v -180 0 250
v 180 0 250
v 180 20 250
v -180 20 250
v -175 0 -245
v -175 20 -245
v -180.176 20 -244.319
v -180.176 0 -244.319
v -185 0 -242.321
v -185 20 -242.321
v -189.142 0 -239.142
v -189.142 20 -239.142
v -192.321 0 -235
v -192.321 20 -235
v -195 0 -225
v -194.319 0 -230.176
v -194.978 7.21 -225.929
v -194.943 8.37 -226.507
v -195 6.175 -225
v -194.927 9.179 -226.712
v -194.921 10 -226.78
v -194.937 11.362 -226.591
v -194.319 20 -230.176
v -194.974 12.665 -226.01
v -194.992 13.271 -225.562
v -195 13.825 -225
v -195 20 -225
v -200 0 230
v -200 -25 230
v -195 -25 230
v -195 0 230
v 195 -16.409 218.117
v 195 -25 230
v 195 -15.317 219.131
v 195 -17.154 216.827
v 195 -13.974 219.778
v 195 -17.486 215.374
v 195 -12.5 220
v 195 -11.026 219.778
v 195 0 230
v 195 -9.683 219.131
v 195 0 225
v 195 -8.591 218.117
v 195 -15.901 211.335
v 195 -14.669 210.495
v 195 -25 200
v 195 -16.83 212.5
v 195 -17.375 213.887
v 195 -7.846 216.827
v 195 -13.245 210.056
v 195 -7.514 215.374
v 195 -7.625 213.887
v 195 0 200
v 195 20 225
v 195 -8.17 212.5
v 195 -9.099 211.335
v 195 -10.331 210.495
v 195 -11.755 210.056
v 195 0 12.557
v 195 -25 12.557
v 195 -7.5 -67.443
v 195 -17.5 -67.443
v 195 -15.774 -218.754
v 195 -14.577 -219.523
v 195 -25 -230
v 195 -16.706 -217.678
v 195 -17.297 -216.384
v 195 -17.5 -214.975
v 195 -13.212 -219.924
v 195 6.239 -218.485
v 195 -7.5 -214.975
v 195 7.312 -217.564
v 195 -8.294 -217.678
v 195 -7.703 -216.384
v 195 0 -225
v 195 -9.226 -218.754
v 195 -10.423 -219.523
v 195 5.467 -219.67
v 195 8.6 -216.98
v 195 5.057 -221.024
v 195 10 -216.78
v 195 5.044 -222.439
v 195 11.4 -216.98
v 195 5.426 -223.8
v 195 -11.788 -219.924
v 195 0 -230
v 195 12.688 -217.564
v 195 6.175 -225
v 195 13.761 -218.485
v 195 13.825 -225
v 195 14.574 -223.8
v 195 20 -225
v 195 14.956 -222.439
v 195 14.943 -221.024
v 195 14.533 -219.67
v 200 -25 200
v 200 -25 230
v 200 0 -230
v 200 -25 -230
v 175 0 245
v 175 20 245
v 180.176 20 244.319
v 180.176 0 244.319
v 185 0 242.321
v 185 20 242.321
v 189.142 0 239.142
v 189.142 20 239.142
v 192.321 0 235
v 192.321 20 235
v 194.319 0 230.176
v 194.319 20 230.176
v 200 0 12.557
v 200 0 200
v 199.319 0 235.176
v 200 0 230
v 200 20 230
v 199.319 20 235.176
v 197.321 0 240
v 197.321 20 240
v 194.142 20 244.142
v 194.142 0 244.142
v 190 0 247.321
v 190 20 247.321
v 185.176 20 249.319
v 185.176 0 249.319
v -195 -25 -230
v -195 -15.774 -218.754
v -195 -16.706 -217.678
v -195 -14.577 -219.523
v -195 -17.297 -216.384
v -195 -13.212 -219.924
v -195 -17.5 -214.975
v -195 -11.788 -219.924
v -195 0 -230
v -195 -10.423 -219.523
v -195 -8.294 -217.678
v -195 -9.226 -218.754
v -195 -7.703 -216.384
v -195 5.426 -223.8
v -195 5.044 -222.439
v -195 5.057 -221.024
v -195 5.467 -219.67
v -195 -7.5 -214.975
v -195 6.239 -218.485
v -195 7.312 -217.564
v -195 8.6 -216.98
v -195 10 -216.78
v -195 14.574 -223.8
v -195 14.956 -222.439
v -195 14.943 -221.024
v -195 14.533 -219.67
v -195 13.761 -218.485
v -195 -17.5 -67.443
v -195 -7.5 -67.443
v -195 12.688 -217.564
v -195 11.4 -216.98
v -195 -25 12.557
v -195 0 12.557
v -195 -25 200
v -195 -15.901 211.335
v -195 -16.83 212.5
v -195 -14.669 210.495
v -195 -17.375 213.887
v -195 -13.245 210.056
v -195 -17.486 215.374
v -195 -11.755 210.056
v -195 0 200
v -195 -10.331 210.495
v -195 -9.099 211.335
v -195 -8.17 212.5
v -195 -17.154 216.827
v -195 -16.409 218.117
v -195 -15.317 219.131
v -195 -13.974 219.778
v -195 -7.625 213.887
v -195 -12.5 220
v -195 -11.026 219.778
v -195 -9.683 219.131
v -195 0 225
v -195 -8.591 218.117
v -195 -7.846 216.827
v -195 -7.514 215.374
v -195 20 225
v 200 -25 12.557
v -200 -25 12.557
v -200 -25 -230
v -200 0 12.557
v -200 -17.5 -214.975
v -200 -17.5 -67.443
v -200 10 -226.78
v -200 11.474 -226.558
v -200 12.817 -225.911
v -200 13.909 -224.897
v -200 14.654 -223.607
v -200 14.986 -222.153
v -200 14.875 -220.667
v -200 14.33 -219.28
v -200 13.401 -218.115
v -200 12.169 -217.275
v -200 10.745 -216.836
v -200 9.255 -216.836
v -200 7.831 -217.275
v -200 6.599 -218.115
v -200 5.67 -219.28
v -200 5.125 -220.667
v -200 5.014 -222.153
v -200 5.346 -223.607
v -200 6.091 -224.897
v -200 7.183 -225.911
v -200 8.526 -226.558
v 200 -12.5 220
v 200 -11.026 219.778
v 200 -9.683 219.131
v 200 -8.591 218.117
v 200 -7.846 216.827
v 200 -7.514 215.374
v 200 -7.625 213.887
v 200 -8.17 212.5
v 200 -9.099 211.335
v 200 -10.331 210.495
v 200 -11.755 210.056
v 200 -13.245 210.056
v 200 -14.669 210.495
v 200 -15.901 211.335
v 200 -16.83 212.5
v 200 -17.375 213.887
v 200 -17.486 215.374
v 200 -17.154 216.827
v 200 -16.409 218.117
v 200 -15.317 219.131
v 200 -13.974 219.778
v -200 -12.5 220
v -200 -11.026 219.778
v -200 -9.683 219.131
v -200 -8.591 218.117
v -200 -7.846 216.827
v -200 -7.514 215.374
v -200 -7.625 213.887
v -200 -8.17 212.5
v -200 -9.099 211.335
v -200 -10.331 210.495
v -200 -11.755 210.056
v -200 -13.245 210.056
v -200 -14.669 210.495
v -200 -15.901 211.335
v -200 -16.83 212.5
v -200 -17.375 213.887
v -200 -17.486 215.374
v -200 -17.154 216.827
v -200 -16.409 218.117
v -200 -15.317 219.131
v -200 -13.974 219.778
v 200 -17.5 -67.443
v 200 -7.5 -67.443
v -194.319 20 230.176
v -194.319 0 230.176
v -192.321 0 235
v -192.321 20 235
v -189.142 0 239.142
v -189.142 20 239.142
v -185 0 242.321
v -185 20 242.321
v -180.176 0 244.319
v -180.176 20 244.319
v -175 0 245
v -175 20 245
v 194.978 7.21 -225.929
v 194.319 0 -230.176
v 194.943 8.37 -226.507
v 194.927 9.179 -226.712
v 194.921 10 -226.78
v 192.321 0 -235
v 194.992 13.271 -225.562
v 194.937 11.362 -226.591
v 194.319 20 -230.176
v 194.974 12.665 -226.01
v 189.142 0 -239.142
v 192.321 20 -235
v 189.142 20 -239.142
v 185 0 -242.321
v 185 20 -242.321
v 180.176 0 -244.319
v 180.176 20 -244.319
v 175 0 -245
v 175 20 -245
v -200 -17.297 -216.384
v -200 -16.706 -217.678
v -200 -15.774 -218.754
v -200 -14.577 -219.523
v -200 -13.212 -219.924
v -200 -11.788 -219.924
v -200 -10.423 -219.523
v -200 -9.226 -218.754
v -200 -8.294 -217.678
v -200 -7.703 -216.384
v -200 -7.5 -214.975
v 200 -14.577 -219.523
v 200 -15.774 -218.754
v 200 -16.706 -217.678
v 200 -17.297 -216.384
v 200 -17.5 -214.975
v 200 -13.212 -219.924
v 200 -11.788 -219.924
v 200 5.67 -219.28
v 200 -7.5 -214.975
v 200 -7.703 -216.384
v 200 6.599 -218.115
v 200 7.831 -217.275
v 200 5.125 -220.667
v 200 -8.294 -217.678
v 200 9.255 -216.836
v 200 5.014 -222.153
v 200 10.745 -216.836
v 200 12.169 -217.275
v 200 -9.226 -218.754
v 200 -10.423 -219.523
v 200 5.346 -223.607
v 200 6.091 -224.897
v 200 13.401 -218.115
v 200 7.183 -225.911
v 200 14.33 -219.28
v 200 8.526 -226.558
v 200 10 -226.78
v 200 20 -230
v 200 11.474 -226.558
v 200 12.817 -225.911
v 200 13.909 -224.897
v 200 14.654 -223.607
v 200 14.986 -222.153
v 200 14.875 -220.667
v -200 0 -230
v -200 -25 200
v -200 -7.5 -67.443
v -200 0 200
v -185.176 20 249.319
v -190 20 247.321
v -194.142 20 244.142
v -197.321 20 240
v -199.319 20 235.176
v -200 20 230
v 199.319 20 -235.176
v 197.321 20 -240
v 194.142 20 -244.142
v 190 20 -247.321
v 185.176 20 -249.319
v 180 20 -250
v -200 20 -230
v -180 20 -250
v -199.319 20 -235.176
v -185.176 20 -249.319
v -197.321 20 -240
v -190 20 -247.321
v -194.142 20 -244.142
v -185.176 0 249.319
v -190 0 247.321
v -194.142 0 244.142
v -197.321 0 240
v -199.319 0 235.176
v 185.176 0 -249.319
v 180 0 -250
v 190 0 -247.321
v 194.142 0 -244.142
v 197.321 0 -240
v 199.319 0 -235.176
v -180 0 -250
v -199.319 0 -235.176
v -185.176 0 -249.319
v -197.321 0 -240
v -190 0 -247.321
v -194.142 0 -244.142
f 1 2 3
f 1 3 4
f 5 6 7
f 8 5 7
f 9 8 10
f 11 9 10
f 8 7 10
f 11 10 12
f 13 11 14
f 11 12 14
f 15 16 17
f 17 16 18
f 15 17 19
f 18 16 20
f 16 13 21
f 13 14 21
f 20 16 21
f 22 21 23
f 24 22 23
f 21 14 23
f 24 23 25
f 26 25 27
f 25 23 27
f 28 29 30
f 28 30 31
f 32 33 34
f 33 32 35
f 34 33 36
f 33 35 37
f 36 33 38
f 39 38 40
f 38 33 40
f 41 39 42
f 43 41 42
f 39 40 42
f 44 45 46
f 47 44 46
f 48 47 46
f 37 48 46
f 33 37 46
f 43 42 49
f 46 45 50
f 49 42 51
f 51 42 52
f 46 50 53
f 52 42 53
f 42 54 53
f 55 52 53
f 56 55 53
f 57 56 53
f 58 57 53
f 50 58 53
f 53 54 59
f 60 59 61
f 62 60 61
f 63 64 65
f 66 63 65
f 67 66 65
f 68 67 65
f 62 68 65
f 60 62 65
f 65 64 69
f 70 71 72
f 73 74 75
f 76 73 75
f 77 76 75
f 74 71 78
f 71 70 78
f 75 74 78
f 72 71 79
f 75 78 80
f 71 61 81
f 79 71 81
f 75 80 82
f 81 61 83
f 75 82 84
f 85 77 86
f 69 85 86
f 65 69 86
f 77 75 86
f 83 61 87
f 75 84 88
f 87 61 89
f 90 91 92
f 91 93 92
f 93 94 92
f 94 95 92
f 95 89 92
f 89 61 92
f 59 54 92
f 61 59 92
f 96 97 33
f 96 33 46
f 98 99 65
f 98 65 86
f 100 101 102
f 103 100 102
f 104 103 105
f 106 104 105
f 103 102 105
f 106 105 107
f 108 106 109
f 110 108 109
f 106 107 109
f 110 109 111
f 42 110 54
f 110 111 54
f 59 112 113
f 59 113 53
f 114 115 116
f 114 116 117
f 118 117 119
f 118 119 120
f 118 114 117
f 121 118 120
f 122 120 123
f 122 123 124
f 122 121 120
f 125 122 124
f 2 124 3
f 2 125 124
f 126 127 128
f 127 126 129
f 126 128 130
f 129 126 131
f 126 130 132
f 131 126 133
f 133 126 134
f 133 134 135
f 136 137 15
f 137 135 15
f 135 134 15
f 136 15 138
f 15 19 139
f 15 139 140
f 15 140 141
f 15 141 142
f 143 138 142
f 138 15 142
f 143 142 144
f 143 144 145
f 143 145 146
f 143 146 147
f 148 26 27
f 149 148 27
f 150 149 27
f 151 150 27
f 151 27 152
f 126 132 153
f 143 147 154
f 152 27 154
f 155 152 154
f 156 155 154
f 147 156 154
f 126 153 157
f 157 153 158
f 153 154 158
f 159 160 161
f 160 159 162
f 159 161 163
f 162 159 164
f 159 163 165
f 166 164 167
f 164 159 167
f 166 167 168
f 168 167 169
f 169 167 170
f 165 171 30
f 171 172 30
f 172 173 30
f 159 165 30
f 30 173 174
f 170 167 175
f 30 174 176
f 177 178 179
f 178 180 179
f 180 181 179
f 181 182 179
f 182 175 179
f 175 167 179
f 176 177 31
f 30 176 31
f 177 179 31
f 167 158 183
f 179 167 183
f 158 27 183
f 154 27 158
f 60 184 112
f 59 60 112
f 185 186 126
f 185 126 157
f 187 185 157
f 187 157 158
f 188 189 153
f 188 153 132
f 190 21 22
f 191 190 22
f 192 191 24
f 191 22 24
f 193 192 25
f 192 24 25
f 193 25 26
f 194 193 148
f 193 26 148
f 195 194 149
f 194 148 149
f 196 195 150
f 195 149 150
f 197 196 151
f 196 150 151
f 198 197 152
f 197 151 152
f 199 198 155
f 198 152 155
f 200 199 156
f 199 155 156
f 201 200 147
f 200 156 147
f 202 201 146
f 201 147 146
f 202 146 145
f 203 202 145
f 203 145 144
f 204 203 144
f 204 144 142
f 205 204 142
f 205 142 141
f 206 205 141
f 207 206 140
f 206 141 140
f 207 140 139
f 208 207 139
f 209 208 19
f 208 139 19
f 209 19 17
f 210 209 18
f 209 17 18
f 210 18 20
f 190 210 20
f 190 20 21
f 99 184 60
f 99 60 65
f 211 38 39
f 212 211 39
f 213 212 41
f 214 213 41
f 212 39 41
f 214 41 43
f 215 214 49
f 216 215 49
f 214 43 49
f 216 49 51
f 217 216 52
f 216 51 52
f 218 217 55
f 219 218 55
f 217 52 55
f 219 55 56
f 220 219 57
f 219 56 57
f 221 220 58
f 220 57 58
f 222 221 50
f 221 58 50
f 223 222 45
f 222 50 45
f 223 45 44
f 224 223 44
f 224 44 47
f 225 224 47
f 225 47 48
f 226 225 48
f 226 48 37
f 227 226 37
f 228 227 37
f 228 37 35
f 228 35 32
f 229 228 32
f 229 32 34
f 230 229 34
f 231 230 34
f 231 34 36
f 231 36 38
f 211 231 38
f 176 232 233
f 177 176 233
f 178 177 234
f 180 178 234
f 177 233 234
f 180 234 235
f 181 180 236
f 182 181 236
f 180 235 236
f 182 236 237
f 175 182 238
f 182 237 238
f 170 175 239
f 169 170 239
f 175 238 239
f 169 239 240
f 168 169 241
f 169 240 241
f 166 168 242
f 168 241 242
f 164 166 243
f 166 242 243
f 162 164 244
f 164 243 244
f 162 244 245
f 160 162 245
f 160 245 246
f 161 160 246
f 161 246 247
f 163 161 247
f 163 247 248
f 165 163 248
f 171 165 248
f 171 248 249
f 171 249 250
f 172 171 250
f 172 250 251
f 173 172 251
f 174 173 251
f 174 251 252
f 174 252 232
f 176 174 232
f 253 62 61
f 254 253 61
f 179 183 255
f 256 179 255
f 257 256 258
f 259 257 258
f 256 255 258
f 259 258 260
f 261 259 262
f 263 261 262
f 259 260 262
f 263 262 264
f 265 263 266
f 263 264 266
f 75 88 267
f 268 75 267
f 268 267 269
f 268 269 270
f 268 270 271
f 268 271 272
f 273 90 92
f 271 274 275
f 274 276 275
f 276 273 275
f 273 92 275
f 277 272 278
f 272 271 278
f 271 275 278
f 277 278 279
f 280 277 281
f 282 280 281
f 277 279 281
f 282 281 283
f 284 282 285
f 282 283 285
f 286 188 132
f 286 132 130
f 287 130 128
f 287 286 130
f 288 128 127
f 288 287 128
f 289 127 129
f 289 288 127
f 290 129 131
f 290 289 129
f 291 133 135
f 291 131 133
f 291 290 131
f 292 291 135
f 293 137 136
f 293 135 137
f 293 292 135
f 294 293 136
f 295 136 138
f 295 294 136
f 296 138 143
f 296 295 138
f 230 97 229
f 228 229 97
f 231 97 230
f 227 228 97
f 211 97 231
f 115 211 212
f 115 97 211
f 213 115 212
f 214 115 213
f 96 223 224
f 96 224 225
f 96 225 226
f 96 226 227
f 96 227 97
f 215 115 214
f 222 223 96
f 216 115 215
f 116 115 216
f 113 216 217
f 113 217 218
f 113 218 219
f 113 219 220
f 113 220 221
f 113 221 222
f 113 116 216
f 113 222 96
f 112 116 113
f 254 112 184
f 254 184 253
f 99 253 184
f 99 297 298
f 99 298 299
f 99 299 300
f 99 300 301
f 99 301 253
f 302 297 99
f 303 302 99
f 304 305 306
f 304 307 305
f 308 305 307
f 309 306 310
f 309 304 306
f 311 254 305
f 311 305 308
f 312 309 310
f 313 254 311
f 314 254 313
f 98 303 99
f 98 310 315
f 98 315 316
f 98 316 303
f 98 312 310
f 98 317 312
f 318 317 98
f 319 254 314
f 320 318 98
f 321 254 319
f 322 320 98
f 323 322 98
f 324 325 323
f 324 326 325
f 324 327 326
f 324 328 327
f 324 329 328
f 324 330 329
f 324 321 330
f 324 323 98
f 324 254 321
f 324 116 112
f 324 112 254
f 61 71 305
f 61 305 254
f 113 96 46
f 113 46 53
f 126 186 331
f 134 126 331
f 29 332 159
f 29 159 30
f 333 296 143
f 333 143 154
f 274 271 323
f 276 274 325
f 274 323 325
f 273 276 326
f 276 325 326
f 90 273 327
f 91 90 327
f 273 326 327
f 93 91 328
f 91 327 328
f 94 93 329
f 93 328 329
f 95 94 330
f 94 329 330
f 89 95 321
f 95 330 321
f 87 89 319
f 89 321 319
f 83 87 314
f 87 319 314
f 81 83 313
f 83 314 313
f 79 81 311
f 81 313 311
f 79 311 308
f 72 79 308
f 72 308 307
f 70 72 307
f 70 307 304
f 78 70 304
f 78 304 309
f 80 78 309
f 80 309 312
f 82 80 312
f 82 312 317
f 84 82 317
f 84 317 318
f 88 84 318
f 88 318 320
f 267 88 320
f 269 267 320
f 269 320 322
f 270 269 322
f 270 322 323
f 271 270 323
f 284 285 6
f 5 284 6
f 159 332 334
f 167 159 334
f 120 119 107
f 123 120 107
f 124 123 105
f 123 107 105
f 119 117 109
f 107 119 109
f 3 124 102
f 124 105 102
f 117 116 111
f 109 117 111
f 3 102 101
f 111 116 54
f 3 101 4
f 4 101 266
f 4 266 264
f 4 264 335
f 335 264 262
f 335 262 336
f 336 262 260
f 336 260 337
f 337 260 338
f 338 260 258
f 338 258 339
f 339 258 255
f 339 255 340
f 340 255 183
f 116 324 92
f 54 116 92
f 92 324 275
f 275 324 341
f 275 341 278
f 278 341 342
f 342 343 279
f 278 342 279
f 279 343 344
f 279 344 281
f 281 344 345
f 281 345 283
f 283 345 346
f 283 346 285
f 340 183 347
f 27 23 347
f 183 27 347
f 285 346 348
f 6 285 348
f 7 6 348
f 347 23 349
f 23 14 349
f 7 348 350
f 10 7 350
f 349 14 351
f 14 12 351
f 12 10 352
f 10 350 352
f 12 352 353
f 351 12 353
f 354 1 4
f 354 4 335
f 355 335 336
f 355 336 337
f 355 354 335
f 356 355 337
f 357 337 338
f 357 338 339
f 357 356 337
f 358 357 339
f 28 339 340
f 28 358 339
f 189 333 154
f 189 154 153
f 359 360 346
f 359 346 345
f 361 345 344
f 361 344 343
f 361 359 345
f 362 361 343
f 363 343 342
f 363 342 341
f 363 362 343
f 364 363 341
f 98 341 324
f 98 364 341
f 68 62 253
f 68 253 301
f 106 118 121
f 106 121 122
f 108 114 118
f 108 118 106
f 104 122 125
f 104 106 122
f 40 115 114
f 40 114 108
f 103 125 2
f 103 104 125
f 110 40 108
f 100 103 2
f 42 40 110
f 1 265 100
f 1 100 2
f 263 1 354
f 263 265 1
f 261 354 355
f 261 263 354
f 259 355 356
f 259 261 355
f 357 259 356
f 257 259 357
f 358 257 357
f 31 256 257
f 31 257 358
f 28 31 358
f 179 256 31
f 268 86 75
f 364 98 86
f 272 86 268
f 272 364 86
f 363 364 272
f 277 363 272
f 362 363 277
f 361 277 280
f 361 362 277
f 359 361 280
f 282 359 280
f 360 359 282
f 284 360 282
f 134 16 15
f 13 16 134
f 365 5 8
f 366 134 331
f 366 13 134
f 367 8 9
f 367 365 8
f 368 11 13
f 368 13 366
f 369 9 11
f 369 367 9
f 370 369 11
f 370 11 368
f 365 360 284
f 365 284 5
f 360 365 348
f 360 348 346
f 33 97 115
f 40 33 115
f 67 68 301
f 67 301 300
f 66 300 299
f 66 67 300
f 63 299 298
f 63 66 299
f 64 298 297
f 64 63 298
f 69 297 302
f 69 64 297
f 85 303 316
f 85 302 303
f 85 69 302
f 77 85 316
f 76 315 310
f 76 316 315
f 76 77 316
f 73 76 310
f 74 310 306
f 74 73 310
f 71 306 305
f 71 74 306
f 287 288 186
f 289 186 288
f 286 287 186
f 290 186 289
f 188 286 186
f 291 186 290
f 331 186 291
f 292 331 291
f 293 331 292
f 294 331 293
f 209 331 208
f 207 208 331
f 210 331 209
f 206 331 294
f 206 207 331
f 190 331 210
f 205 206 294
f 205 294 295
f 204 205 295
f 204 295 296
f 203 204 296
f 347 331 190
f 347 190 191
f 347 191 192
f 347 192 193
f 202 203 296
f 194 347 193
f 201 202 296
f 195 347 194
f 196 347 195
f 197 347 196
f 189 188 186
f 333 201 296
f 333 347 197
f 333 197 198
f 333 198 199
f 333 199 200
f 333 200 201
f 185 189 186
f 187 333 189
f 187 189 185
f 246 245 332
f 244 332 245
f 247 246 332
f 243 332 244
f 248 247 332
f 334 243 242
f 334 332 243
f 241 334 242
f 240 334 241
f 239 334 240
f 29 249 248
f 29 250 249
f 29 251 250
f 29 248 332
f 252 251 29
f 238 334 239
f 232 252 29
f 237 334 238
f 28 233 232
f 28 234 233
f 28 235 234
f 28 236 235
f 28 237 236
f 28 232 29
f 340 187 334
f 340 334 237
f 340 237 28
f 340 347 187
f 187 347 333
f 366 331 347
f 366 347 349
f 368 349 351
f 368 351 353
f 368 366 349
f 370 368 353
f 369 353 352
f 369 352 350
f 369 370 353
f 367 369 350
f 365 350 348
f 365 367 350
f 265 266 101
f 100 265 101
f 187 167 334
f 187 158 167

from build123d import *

# Parameters (mm, degrees)
BOSS_EXTRUDE2_DEPTH     = 20
CUT_EXTRUDE1_DEPTH      = 20
SKETCH7_W               = 242.556539121
SKETCH7_H               = 25
BOSS_EXTRUDE3_DEPTH     = 5
SKETCH8_W               = 242.556539121
SKETCH8_H               = 25
BOSS_EXTRUDE4_DEPTH     = 5
CUT_EXTRUDE2_DEPTH      = 473.361090692
CUT_EXTRUDE2_DEPTH_BACK = 473.361090692
SKETCH11_W              = 30
SKETCH11_H              = 25
BOSS_EXTRUDE5_DEPTH     = 5
SKETCH13_W              = 30
SKETCH13_H              = 25
BOSS_EXTRUDE6_DEPTH     = 5
SKETCH14_R              = 5
CUT_EXTRUDE3_DEPTH      = 473.361090692
BOSS_EXTRUDE7_DEPTH     = 5
BOSS_EXTRUDE8_START     = -5
BOSS_EXTRUDE8_DEPTH     = 5
SKETCH19_R              = 5
CUT_EXTRUDE4_DEPTH      = 473.361090692


with BuildPart() as part:
    # Sketch5 → Boss-Extrude2 (new body)
    with BuildSketch(Plane(origin=(0, 0, 0), x_dir=(1, 0, 0), z_dir=(0, 1, 0))):
        with BuildLine():
            Line((-180, 250), (180, 250))
            ThreePointArc((180, 250), (194.142135624, 244.142135624), (200, 230))
            Line((200, 230), (200, -230))
            ThreePointArc((200, -230), (194.142135624, -244.142135624), (180, -250))
            Line((180, -250), (-180, -250))
            ThreePointArc((-180, -250), (-194.142135624, -244.142135624), (-200, -230))
            Line((-200, -230), (-200, 230))
            ThreePointArc((-200, 230), (-194.142135624, 244.142135624), (-180, 250))
        make_face()
    extrude(amount=BOSS_EXTRUDE2_DEPTH)

    # Sketch6 → Cut-Extrude1 (cut)
    with BuildSketch(Plane(origin=(0, 20, 0), x_dir=(1, 0, 0), z_dir=(0, 1, 0))):
        with BuildLine():
            Line((-175, -245), (175, -245))
            ThreePointArc((175, -245), (189.142135624, -239.142135624), (195, -225))
            Line((195, -225), (195, 225))
            ThreePointArc((195, 225), (189.142135624, 239.142135624), (175, 245))
            Line((175, 245), (-175, 245))
            ThreePointArc((-175, 245), (-189.142135624, 239.142135624), (-195, 225))
            Line((-195, 225), (-195, -225))
            ThreePointArc((-195, -225), (-189.142135624, -239.142135624), (-175, -245))
        make_face()
    extrude(amount=-CUT_EXTRUDE1_DEPTH, mode=Mode.SUBTRACT)

    # Sketch7 → Boss-Extrude3 (add)
    with BuildSketch(Plane(origin=(200, 0, 0), x_dir=(0, 0, -1), z_dir=(1, 0, 0))):
        with Locations((108.72173044, -12.5)):
            Rectangle(SKETCH7_W, SKETCH7_H)
    extrude(amount=-BOSS_EXTRUDE3_DEPTH)

    # Sketch8 → Boss-Extrude4 (add)
    with BuildSketch(Plane.ZY.offset(200)):
        with Locations((-108.72173044, -12.5)):
            Rectangle(SKETCH8_W, SKETCH8_H)
    extrude(amount=-BOSS_EXTRUDE4_DEPTH)

    # Sketch10 → Cut-Extrude2 (cut, two sides: drawn at the far end of the back side and taken through both)
    with BuildSketch(Plane(origin=(200, 0, 0), x_dir=(0, 0, -1), z_dir=(1, 0, 0)).offset(-CUT_EXTRUDE2_DEPTH_BACK)):
        with BuildLine():
            Line((214.975112076, -7.5), (2.443460879, -7.5))
            ThreePointArc((2.443460879, -7.5), (-2.556539121, -12.5), (2.443460879, -17.5))
            Line((2.443460879, -17.5), (214.975112076, -17.5))
            ThreePointArc((214.975112076, -17.5), (219.975112076, -12.5), (214.975112076, -7.5))
        make_face()
    extrude(amount=CUT_EXTRUDE2_DEPTH + CUT_EXTRUDE2_DEPTH_BACK, mode=Mode.SUBTRACT)

    # Sketch11 → Boss-Extrude5 (add)
    with BuildSketch(Plane(origin=(200, 0, 0), x_dir=(0, 0, -1), z_dir=(1, 0, 0))):
        with Locations((-215, -12.5)):
            Rectangle(SKETCH11_W, SKETCH11_H)
    extrude(amount=-BOSS_EXTRUDE5_DEPTH)

    # Sketch13 → Boss-Extrude6 (add)
    with BuildSketch(Plane.ZY.offset(200)):
        with Locations((215, -12.5)):
            Rectangle(SKETCH13_W, SKETCH13_H)
    extrude(amount=-BOSS_EXTRUDE6_DEPTH)

    # Sketch14 → Cut-Extrude3 (cut, through all)
    with BuildSketch(Plane.ZY.offset(200)):
        with Locations((215, -12.5)):
            Circle(SKETCH14_R)
    extrude(amount=-CUT_EXTRUDE3_DEPTH, mode=Mode.SUBTRACT)

    # Sketch16 → Boss-Extrude7 (add)
    with BuildSketch(Plane.ZY.offset(200)):
        with BuildLine():
            Line((-67.443460879, -17.5), (-2.443460879, -17.5))
            ThreePointArc((-2.443460879, -17.5), (2.556539121, -12.5), (-2.443460879, -7.5))
            Line((-2.443460879, -7.5), (-67.443460879, -7.5))
            Line((-67.443460879, -7.5), (-67.443460879, -17.5))
        make_face()
    extrude(amount=-BOSS_EXTRUDE7_DEPTH)

    # Sketch17 → Boss-Extrude8 (add)
    with BuildSketch(Plane(origin=(200, 0, 0), x_dir=(0, 0, -1), z_dir=(1, 0, 0)).offset(BOSS_EXTRUDE8_START)):
        with BuildLine():
            Line((67.443460879, -17.5), (67.443460879, -7.5))
            Line((67.443460879, -7.5), (2.443460879, -7.5))
            ThreePointArc((2.443460879, -7.5), (-2.556539121, -12.5), (2.443460879, -17.5))
            Line((2.443460879, -17.5), (67.443460879, -17.5))
        make_face()
    extrude(amount=BOSS_EXTRUDE8_DEPTH)

    # Sketch19 → Cut-Extrude4 (cut, through all)
    with BuildSketch(Plane(origin=(200, 0, 0), x_dir=(0, 0, -1), z_dir=(1, 0, 0))):
        with Locations((221.779838072, 10)):
            Circle(SKETCH19_R)
    extrude(amount=-CUT_EXTRUDE4_DEPTH, mode=Mode.SUBTRACT)


solid = part.part
